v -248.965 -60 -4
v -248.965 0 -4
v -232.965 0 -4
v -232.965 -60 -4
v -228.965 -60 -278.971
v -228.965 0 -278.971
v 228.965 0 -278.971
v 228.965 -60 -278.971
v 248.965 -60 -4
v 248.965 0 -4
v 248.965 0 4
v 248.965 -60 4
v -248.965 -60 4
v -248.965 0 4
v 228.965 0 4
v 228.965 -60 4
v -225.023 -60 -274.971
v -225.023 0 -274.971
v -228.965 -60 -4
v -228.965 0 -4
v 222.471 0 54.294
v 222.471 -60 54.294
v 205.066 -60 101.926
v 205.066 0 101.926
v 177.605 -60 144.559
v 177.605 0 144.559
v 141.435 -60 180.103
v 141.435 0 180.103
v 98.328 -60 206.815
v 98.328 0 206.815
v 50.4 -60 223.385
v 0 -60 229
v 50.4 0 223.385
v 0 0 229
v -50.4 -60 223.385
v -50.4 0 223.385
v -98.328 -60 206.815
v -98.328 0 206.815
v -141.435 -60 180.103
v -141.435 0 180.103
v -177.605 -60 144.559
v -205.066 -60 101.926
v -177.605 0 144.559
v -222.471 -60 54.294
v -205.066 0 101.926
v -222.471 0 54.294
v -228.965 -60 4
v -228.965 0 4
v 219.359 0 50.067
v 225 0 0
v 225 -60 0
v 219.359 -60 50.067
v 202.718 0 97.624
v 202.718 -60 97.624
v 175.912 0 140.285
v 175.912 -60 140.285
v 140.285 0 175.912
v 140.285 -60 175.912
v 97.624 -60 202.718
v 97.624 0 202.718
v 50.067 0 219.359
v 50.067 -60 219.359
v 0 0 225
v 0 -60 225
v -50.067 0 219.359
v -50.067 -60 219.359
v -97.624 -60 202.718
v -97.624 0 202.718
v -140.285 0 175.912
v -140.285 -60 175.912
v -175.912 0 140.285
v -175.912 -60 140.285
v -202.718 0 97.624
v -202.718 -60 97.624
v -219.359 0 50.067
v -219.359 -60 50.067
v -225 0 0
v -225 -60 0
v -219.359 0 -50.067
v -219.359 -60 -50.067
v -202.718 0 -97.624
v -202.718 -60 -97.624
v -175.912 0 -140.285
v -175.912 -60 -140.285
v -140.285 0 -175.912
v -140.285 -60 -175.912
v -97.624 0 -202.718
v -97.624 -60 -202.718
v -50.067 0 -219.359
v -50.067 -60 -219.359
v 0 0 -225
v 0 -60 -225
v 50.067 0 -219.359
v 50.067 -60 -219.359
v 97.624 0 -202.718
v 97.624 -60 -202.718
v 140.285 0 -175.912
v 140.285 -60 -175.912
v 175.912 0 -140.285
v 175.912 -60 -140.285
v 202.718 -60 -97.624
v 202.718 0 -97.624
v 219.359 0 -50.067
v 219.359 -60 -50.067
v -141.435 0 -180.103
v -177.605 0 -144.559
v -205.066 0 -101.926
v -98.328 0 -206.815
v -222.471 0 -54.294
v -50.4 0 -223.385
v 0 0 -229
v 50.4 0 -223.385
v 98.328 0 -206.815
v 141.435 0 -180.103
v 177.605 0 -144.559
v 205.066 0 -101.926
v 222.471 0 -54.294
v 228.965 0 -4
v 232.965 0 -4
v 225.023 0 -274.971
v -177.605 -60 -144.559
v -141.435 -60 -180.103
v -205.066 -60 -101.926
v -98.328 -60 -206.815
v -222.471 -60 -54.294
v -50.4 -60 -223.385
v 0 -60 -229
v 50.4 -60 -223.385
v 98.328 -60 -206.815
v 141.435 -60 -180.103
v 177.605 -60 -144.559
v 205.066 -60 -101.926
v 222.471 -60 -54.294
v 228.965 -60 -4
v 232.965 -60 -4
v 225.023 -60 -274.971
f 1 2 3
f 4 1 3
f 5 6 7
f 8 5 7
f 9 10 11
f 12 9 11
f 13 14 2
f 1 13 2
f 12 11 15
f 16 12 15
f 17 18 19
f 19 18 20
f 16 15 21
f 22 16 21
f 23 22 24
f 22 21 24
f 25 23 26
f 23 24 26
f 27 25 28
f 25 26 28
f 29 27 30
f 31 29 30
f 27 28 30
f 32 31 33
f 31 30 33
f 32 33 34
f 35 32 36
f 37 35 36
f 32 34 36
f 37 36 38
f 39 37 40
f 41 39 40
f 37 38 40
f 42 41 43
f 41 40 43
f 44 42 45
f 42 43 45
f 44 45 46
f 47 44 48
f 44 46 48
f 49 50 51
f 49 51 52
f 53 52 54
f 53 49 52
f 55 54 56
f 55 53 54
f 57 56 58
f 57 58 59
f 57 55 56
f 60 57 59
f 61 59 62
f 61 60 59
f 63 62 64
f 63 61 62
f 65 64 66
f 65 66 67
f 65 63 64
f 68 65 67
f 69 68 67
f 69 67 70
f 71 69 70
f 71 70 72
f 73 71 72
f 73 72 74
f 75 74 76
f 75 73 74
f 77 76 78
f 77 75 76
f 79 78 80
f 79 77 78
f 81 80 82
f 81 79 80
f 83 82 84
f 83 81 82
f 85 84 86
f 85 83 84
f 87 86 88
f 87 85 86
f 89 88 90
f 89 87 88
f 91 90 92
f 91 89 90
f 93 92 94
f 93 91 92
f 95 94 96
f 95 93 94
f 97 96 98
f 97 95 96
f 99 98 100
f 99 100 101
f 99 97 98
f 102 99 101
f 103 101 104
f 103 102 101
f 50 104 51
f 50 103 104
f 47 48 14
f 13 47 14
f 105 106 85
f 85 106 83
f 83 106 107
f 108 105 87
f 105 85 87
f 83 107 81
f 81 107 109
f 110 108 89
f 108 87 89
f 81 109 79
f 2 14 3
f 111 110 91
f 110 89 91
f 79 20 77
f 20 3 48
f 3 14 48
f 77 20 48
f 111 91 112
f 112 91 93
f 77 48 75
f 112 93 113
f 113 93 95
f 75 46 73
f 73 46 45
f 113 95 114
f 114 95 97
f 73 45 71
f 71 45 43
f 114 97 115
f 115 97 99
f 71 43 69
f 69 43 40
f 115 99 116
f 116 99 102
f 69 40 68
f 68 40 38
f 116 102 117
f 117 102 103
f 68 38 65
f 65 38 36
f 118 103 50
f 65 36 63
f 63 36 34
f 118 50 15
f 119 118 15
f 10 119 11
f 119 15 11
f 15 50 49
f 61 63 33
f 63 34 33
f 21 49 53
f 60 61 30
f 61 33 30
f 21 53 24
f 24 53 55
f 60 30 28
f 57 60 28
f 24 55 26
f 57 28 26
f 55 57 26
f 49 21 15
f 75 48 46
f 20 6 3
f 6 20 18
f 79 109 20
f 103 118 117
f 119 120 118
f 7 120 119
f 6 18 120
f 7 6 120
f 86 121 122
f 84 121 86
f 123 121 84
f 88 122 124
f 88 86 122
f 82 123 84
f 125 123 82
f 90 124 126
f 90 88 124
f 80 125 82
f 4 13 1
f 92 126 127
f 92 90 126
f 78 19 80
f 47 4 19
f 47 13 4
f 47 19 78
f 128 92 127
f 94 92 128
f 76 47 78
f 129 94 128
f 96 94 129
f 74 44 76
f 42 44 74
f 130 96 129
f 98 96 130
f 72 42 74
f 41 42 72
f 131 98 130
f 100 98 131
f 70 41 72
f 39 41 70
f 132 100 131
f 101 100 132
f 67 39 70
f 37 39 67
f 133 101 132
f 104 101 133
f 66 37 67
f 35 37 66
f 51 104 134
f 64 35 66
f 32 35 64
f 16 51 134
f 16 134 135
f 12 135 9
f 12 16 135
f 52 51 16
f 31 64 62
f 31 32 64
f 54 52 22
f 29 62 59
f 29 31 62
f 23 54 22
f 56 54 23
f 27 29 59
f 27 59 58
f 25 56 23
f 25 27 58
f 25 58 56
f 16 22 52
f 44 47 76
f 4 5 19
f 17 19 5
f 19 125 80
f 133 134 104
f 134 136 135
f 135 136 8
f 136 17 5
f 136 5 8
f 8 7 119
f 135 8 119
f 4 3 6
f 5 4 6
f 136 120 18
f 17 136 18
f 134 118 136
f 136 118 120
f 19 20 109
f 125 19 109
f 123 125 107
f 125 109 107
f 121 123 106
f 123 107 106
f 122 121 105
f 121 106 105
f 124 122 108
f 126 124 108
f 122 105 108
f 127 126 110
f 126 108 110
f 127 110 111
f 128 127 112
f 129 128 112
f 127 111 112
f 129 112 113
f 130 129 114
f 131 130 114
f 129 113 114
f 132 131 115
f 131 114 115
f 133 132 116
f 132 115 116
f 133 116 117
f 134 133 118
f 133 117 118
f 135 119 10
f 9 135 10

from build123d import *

# Parameters (mm, degrees)
F0_R     = 225
F1_DEPTH = 60


with BuildPart() as f1:
    # F0 (on Front) → F1 (new body)
    with BuildSketch(Plane.XZ):
        with BuildLine():
            ThreePointArc((228.965063, -4), (228.991266, -2.000076), (229, 0))
            ThreePointArc((229, 0), (228.991266, 2.000076), (228.965063, 4))
            ThreePointArc((228.965063, 4), (0, 229), (-228.965063, 4))
            ThreePointArc((-228.965063, 4), (-229, 0), (-228.965063, -4))
            ThreePointArc((-228.965063, -4), (0, -229), (228.965063, -4))
        make_face()
        Circle(F0_R, mode=Mode.SUBTRACT)
        with BuildLine():
            ThreePointArc((228.965063, 4), (228.991266, 2.000076), (229, 0))
            ThreePointArc((229, 0), (228.991266, -2.000076), (228.965063, -4))
            Line((228.965063, -4), (232.965486, -4))
            Line((232.965486, -4), (248.965063, -4))
            Line((248.965063, -4), (248.965063, 0))
            Line((248.965063, 0), (248.965063, 4))
            Line((248.965063, 4), (228.965063, 4))
        make_face()
        Polygon((232.965486, -4), (228.965063, -4), (225.022834, -274.970901), (-225.022834, -274.970901), (-228.965063, -4), (-232.965486, -4), (-228.965063, -278.970901), (228.965063, -278.970901), align=None)
        with BuildLine():
            ThreePointArc((-228.965063, -4), (-229, 0), (-228.965063, 4))
            Line((-228.965063, 4), (-248.965063, 4))
            Line((-248.965063, 4), (-248.965063, 0))
            Line((-248.965063, 0), (-248.965063, -4))
            Line((-248.965063, -4), (-232.965486, -4))
            Line((-232.965486, -4), (-228.965063, -4))
        make_face()
    extrude(amount=F1_DEPTH)


solid = f1.part
